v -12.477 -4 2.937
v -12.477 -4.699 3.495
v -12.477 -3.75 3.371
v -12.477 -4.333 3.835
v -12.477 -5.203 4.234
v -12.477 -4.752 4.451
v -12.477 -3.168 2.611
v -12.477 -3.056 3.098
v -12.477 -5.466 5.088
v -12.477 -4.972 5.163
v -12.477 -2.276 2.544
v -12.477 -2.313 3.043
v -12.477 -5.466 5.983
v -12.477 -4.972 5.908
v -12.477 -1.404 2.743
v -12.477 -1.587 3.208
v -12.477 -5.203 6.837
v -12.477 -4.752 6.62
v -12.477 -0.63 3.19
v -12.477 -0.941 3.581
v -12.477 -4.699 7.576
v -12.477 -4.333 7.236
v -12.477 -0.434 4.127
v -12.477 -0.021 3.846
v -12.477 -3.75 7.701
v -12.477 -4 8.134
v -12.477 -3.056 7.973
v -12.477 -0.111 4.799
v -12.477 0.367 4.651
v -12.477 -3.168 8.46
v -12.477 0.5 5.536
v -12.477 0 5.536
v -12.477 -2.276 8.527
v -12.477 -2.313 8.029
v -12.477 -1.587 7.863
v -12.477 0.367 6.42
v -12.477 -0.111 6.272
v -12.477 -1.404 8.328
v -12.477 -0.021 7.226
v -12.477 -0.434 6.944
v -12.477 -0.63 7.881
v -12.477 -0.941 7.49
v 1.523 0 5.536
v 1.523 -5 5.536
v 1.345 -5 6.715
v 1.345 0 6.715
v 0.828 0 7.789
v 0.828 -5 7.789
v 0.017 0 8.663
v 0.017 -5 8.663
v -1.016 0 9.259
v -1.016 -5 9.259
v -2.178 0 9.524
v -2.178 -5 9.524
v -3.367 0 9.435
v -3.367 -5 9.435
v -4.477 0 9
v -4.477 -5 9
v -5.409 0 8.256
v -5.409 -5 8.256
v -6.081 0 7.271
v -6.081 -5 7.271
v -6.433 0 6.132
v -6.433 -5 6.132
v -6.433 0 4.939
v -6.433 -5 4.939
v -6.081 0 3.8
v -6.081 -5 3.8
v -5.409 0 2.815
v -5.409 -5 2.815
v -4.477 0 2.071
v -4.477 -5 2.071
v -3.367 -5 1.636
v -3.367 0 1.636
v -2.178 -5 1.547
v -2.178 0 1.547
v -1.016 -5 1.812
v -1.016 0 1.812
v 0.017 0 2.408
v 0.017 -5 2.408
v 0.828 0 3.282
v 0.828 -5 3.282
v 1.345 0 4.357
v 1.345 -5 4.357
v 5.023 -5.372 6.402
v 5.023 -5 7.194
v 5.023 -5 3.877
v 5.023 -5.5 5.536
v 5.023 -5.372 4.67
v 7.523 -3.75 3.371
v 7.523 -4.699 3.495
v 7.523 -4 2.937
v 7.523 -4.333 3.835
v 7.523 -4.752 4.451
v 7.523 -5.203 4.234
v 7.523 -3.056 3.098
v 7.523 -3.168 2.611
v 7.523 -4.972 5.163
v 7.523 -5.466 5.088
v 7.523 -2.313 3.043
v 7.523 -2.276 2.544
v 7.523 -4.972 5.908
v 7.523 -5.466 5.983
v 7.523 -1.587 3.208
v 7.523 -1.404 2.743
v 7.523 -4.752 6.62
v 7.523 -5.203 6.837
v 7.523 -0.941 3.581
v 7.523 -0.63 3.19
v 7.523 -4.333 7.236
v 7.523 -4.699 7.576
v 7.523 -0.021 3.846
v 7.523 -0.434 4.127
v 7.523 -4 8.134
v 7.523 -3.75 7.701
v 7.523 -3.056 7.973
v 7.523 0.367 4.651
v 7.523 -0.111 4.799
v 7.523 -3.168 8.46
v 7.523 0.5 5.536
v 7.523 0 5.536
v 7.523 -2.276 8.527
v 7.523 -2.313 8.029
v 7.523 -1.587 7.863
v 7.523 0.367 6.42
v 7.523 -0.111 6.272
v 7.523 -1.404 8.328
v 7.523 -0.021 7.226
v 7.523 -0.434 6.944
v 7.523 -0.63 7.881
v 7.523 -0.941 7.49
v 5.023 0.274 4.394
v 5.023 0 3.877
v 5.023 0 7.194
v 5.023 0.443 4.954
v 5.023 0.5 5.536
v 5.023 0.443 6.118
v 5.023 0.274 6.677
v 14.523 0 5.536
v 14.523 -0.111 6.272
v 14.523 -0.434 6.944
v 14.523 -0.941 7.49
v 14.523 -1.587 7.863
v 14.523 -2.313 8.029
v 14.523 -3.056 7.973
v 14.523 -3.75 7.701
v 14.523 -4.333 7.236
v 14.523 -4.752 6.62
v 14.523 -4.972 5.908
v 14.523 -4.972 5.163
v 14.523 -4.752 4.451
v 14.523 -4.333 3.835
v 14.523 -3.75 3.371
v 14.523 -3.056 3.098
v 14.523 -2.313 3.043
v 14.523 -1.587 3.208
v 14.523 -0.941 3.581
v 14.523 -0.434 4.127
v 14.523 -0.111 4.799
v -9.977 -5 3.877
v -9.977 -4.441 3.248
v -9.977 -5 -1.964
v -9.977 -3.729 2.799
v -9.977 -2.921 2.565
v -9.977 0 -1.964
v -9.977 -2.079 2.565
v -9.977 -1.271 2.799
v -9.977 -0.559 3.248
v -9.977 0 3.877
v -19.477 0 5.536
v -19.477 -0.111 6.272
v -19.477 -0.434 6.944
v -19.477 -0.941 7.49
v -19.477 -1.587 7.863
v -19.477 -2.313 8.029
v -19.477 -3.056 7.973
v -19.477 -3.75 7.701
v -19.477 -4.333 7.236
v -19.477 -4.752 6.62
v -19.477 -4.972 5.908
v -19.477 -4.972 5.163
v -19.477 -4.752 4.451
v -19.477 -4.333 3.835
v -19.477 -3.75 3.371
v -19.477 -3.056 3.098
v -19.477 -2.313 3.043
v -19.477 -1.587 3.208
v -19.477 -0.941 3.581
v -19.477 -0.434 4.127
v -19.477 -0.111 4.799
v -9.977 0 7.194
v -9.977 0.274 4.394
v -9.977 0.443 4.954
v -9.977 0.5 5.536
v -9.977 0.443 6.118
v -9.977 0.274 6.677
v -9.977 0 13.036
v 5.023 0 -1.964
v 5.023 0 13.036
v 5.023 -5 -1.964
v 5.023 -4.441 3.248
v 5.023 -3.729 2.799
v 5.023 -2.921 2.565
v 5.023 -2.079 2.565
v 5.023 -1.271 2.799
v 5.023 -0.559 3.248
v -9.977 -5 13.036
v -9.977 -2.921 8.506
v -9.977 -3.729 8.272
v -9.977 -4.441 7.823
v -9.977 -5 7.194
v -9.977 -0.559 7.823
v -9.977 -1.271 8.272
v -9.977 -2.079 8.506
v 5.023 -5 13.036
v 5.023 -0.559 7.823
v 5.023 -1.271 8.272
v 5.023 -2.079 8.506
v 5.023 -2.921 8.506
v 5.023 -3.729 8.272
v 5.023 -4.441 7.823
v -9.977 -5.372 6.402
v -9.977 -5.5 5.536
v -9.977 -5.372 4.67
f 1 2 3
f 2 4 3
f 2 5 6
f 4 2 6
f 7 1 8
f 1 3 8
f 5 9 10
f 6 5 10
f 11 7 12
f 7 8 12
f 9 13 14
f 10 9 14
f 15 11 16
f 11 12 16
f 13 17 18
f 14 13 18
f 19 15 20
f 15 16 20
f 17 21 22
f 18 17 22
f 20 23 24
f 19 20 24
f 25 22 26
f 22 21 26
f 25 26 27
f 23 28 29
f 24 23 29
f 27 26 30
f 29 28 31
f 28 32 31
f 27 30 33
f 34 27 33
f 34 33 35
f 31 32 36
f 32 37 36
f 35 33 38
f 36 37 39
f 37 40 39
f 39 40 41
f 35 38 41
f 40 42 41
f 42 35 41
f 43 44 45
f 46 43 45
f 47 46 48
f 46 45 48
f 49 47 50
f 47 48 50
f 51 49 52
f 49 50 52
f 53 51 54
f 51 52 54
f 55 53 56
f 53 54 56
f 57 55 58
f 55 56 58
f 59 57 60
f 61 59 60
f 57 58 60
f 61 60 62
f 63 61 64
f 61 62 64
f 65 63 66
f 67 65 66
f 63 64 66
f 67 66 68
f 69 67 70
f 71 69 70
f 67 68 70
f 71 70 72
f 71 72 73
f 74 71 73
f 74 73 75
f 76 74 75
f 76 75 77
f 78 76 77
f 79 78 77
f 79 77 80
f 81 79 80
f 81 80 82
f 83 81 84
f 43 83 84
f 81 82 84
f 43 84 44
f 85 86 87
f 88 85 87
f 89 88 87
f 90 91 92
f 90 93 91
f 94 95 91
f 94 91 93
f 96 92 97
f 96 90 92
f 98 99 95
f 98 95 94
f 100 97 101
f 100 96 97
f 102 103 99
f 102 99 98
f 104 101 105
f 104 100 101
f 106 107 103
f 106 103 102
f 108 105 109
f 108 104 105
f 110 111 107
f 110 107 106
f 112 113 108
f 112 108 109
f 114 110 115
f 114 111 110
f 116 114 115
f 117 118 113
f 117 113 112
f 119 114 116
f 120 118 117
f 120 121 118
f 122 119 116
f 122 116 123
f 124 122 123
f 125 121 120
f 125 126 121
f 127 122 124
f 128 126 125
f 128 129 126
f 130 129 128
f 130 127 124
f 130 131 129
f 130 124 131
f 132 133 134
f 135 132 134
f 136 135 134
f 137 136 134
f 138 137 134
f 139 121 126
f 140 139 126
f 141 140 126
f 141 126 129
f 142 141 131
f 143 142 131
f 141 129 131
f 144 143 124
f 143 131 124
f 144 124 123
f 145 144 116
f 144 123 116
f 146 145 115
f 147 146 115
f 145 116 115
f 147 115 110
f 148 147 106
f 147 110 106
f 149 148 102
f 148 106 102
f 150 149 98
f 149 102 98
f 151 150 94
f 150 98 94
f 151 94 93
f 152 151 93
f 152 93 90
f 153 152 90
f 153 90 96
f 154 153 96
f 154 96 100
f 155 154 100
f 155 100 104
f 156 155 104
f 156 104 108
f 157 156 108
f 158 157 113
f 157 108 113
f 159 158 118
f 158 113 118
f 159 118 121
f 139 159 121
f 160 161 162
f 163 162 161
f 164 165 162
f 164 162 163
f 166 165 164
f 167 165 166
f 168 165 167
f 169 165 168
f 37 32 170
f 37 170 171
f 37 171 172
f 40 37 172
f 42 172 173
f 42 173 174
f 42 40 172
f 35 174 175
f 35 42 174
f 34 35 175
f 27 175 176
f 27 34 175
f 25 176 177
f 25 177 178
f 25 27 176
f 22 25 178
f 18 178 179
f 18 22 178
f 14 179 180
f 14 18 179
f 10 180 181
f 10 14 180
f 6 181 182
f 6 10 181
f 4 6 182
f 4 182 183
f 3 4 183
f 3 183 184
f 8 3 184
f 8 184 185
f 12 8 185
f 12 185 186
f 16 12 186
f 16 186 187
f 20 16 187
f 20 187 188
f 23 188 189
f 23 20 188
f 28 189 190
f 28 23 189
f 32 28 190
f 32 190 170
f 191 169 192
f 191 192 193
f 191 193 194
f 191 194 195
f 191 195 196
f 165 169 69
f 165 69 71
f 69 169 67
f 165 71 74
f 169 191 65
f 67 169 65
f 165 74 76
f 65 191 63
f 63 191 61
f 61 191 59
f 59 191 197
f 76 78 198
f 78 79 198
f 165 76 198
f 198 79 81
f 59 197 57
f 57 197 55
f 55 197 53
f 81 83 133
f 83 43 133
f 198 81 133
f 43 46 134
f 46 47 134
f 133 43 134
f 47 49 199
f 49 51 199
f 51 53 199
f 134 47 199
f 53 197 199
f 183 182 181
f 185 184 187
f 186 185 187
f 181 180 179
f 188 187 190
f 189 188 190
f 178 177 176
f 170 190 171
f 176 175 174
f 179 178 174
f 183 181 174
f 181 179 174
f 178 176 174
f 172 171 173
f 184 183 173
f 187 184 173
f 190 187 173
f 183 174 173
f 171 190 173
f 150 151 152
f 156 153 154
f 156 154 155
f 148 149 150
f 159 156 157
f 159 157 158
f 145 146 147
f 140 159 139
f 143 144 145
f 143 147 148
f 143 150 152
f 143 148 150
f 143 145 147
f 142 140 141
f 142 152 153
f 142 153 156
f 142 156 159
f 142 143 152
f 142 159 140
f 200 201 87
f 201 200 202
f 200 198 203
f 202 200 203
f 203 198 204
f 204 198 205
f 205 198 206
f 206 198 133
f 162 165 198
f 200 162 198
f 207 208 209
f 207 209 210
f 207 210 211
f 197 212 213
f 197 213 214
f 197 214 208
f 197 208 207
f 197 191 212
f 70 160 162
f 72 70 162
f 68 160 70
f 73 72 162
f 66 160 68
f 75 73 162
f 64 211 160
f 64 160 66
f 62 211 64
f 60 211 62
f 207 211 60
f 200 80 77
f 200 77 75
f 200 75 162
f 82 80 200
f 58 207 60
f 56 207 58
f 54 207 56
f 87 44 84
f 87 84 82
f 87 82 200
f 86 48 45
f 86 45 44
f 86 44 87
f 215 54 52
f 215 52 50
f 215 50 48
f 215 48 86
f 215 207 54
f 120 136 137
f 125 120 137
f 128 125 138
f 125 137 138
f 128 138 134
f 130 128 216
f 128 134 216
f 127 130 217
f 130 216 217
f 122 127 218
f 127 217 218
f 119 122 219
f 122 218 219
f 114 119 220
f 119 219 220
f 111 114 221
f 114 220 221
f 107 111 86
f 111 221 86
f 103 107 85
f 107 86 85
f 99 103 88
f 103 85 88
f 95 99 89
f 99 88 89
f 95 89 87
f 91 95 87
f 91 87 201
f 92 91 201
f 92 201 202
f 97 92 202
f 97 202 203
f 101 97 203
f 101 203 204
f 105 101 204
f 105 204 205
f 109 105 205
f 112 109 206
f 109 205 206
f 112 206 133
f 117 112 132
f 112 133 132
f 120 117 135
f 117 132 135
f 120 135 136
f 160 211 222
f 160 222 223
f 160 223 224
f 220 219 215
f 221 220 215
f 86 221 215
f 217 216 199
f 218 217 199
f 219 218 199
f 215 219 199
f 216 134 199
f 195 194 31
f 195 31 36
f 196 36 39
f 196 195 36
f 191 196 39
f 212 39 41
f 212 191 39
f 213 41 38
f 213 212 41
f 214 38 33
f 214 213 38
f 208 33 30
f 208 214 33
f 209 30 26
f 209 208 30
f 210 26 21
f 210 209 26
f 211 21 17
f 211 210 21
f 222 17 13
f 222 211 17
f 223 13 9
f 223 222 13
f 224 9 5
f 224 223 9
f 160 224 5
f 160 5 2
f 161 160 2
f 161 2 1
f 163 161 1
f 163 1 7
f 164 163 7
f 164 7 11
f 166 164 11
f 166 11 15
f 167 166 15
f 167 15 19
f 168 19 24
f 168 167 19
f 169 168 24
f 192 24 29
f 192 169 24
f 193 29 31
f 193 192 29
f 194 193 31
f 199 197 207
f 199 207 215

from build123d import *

# Parameters (mm, degrees)
F0_W      = 15
F0_H      = 15
F1_DEPTH  = 5
F2_R      = 4
F3_DEPTH  = 25
F4_R      = 3
F5_DEPTH  = 2.5
F10_R     = 2.5
F11_DEPTH = 7


with BuildPart() as f1:
    # F0 (on Front) → F1 (new body)
    with BuildSketch(Plane.XZ):
        with Locations((-2.477283068, 5.5355651764)):
            Rectangle(F0_W, F0_H)
    extrude(amount=F1_DEPTH)

    # F2 (on face) → F3 (cut)
    with BuildSketch(Plane.XZ.offset(5)):
        with Locations((-2.477283068, 5.5355651764)):
            Circle(F2_R)
    extrude(amount=-F3_DEPTH, mode=Mode.SUBTRACT)

    # F4 (on face) → F5 (join)
    with BuildSketch(Plane.YZ.offset(5.022716932)):
        with Locations((-2.5, 5.5355651764)):
            Circle(F4_R)
    extrude(amount=F5_DEPTH)

    # F10 (on face) → F11 (join)
    with BuildSketch(Plane.YZ.offset(7.522716932)):
        with Locations((-2.5, 5.5355651764)):
            Circle(F10_R)
    extrude(amount=F11_DEPTH)

    # F12: F1 across plane


with BuildPart() as f1_1:
    add(f1.part)
    add(f1.part.mirror(Plane(origin=(-2.477283068, 0, 13.0355651764), x_dir=(0, -1, 0), z_dir=(-1, 0, 0))))


solid = f1_1.part
